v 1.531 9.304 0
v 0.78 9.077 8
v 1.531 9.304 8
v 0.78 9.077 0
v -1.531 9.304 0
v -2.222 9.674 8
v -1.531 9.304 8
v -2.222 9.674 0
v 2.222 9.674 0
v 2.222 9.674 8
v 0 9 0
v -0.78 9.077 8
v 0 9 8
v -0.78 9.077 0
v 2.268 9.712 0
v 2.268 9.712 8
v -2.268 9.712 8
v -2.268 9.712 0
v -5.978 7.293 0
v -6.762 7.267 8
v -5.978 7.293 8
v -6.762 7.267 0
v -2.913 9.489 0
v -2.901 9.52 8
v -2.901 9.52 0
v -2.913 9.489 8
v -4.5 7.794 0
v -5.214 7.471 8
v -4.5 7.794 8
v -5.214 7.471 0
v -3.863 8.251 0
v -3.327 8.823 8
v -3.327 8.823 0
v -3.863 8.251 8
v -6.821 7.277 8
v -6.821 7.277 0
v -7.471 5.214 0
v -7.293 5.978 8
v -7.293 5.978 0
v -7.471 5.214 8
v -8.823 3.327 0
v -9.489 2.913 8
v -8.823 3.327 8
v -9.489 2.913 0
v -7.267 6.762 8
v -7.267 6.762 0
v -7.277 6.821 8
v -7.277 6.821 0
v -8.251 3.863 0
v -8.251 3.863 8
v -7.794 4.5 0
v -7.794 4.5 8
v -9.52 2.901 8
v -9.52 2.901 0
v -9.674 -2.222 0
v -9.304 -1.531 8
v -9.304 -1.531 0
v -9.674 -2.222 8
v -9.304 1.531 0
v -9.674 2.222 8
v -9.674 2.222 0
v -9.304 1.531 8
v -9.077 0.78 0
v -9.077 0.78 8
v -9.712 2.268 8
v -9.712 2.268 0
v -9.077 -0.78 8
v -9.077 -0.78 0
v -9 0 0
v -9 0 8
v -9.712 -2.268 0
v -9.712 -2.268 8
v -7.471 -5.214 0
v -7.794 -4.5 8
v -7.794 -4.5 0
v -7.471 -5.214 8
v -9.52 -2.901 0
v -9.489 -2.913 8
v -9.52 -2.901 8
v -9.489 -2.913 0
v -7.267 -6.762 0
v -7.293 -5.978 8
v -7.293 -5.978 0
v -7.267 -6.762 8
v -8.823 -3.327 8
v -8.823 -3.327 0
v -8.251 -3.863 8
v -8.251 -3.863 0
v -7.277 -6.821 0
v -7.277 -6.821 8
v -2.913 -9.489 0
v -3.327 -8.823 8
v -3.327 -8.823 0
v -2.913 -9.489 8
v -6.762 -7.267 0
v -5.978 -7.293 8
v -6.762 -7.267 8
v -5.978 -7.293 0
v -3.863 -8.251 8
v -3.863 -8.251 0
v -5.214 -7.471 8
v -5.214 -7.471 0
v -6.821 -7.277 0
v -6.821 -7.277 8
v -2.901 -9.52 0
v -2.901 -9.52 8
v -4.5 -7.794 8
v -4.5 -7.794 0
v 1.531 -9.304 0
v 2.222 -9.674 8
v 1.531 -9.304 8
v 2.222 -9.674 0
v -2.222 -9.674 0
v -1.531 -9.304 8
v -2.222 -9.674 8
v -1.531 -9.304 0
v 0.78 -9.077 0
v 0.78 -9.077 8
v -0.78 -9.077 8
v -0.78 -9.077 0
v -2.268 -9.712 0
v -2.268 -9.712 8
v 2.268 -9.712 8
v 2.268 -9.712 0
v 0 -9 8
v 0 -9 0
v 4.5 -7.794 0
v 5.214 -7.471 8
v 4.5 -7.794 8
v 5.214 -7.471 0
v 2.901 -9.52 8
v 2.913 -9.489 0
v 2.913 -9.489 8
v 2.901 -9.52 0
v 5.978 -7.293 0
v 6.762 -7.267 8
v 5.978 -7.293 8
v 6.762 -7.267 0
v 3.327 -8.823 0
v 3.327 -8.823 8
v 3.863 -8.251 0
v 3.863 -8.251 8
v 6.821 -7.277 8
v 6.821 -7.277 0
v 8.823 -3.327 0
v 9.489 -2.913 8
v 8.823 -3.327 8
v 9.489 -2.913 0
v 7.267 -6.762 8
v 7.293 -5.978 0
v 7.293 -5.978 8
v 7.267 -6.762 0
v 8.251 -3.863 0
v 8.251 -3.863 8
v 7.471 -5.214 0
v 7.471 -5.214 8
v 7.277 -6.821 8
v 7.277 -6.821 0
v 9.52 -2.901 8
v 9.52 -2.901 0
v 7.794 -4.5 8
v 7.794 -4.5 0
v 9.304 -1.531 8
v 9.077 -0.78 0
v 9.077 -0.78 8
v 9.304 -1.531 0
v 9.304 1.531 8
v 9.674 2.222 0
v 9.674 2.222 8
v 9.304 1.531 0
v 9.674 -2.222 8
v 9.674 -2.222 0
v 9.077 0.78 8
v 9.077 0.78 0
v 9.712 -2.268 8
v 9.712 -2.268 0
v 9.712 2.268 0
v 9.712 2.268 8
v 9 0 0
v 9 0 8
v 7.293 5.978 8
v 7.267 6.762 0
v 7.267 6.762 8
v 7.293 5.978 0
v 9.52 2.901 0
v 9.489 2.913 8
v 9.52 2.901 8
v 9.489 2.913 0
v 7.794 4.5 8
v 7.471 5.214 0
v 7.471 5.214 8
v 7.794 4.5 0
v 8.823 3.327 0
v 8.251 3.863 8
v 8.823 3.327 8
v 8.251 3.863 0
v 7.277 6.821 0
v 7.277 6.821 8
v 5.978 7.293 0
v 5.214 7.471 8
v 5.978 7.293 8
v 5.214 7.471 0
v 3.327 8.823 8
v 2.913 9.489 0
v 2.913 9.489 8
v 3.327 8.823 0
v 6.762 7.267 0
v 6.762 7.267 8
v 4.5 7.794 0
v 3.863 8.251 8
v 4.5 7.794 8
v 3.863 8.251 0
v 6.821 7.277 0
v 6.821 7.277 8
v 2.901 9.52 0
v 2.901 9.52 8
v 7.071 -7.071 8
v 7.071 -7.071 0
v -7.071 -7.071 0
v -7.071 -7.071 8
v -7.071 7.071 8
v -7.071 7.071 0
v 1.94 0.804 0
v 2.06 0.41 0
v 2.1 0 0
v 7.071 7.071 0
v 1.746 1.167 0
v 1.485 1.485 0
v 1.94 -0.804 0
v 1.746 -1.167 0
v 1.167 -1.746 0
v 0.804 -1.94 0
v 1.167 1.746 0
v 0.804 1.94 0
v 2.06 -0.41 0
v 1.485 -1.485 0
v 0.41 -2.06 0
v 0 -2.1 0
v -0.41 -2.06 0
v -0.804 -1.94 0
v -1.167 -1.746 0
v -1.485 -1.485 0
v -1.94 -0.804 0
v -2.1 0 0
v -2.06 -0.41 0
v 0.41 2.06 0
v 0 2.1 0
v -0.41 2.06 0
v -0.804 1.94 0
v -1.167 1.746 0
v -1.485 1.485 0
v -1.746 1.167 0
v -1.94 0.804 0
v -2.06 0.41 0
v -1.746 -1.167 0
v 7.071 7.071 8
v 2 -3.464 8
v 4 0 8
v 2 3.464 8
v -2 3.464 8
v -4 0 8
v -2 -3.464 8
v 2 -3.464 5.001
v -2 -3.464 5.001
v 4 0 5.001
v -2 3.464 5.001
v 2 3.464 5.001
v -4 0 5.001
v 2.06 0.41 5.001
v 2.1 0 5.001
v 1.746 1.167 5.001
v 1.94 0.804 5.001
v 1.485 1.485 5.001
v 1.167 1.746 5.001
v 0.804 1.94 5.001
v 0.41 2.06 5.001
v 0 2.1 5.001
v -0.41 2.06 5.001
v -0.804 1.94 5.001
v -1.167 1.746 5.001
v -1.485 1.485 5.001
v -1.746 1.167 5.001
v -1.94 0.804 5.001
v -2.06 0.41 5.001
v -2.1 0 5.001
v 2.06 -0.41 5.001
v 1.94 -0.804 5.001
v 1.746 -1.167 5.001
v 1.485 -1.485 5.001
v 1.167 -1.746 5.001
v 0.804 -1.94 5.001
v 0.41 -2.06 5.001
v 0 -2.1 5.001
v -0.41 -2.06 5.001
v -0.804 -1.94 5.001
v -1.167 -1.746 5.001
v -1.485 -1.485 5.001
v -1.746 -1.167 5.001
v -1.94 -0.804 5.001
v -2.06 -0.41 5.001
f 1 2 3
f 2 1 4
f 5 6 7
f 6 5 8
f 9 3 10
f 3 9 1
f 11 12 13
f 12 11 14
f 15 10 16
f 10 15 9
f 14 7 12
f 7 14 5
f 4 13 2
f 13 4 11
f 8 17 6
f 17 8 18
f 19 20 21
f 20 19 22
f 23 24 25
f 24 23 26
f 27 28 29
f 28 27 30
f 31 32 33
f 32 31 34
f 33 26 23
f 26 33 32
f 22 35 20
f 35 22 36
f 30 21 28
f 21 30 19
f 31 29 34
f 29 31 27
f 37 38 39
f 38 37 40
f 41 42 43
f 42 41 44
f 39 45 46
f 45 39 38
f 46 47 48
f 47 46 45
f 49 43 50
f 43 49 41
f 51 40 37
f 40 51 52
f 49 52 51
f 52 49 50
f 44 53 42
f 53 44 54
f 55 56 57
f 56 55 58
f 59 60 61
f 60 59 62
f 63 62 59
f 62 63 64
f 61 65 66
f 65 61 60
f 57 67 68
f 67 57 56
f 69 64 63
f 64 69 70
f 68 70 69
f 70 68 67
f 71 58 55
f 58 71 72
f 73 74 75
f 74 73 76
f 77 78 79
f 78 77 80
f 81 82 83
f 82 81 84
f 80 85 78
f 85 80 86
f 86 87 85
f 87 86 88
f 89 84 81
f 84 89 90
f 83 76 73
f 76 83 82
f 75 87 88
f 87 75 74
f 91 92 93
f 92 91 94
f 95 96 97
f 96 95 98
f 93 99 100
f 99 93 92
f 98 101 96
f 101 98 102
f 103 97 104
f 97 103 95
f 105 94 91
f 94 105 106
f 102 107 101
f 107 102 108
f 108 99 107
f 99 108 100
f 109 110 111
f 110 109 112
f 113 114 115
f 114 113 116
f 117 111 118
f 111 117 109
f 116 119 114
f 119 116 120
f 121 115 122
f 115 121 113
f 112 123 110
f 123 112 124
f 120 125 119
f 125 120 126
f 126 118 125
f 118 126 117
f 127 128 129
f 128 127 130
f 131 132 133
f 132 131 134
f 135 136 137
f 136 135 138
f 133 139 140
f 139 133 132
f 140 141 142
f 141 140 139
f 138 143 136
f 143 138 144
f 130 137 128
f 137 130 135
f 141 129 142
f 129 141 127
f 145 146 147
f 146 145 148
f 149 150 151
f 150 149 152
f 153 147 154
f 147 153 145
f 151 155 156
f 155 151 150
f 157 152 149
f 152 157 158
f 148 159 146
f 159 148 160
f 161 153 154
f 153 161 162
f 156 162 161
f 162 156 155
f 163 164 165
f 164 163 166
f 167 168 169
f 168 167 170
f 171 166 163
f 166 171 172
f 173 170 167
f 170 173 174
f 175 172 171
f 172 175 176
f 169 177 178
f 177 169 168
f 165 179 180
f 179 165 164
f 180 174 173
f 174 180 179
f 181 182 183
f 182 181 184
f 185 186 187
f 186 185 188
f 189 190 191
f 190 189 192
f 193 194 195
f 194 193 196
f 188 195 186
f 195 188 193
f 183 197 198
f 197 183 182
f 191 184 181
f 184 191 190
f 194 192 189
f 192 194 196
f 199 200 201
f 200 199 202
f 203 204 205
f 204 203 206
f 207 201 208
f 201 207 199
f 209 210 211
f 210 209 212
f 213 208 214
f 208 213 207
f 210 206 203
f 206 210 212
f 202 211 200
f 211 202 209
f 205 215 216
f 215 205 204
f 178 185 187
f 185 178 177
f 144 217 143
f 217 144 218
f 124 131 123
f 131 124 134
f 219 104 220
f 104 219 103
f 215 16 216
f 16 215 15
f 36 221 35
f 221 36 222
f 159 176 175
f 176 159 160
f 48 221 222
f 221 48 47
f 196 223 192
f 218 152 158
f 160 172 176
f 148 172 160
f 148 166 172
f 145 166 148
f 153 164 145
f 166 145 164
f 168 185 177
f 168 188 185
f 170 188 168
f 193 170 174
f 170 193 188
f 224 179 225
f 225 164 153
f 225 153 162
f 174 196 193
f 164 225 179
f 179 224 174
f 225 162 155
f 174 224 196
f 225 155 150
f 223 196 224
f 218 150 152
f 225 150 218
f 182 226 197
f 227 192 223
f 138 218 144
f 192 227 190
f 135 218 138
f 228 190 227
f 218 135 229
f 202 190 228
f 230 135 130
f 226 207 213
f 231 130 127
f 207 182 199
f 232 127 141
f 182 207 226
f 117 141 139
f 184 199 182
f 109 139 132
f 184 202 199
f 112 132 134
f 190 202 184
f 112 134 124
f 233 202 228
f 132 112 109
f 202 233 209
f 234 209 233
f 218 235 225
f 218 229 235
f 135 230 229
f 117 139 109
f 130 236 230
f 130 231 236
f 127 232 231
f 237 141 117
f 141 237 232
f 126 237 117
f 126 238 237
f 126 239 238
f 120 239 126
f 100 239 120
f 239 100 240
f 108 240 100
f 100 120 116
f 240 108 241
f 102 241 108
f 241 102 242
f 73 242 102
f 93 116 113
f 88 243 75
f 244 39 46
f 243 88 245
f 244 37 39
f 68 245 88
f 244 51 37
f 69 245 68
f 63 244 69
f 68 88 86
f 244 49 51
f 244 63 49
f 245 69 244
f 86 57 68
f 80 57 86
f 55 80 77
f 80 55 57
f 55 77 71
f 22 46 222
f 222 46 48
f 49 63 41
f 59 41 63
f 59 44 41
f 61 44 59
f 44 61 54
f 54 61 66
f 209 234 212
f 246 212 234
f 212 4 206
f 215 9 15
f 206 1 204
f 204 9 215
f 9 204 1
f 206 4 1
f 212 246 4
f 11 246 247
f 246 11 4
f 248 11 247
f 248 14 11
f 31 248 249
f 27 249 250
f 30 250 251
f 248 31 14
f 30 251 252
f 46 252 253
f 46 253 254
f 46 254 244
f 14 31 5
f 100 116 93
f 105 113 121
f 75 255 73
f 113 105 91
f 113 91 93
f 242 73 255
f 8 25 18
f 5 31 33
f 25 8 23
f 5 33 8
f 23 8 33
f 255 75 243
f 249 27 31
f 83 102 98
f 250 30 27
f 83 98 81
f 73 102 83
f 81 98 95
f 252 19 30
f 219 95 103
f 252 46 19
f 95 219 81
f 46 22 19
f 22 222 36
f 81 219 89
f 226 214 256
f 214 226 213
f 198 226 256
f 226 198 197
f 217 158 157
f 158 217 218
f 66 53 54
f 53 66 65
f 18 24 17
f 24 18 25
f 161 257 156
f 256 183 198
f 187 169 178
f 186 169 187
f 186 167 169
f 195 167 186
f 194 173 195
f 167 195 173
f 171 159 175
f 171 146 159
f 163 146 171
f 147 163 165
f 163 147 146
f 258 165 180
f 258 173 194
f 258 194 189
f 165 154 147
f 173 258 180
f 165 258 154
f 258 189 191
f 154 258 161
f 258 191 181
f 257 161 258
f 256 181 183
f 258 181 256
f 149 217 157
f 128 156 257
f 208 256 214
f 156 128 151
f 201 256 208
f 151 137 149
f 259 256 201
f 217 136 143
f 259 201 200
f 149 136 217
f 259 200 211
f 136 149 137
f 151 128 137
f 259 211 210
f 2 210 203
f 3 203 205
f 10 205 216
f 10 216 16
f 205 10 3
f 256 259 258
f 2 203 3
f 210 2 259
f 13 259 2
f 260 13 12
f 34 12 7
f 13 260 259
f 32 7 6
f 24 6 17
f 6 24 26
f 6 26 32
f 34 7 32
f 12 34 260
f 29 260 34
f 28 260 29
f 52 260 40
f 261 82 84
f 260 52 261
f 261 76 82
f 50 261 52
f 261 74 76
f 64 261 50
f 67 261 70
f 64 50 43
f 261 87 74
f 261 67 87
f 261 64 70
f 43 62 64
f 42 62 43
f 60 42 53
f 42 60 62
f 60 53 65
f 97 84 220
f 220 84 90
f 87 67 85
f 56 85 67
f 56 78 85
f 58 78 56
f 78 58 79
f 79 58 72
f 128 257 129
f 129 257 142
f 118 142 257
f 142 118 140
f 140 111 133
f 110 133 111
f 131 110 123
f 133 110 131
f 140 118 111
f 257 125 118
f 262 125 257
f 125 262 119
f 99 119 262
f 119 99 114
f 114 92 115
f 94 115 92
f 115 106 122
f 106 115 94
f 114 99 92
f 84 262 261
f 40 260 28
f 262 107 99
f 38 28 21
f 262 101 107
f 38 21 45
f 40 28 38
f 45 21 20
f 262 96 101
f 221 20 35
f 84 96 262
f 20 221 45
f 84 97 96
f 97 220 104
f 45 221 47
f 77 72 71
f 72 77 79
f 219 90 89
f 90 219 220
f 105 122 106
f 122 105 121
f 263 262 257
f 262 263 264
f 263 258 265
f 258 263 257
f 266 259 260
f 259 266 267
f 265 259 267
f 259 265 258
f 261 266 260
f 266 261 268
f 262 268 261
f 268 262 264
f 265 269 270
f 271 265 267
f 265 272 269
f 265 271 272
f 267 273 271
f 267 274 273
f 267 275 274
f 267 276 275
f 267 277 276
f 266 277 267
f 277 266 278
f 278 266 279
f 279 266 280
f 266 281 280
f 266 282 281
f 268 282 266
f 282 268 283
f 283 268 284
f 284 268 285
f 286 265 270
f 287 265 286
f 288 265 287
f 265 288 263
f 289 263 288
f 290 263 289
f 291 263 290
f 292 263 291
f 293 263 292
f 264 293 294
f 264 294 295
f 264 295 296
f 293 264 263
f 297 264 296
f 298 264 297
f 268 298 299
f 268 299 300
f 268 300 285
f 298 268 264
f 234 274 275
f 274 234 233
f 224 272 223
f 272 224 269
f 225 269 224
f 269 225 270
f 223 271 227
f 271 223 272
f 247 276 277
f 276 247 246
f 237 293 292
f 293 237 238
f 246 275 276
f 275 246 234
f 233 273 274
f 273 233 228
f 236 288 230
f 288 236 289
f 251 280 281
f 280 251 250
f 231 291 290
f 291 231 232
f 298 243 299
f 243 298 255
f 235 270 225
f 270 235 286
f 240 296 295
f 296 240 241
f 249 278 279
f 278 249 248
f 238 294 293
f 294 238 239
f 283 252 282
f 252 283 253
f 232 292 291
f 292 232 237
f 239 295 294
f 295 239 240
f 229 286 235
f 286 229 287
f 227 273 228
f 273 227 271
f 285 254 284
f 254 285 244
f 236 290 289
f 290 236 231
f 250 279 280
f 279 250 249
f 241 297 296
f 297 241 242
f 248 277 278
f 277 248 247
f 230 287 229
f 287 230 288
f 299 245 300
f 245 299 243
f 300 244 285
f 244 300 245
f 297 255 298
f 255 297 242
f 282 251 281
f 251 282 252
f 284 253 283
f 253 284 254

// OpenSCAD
module craptray() {
    difference() {
        union() {
            difference(){
                cube([180,140,40]);
                translate([5,5,5]) cube([170,130,40]);        
            }          
            for (p=[[10,10,0],[10,130,0],[170,10,0],[170,130,0]]) {
                translate(p) cylinder(r = 10, h = 40, $fn = 32);
            }  
        }
        for (p=[[10,10,-1],[10,130,-1],[170,10,-1],[170,130,-1]]) {
            translate(p) cylinder(d = 4.2, h = 42, $fn = 32);
            translate(p) cylinder(d = 8.2, h = 4, $fn = 6);
        } 
    }
}

module leg() {
    difference() {
        cylinder(d = 20, h = 8, $fn = 32);  
        translate([0,0,5 + 0.001]) cylinder(d = 8, h = 3, $fn = 6);
        translate([0,0,- 0.001]) cylinder(d = 4.2, h = 10, $fn = 32);
        for (a=[0:30:330]) {
            rotate(a) translate([0,13, -1]) cylinder(d = 8, h = 10, $fn = 32);
        }        
    }
    
}

leg();

// craptray();
